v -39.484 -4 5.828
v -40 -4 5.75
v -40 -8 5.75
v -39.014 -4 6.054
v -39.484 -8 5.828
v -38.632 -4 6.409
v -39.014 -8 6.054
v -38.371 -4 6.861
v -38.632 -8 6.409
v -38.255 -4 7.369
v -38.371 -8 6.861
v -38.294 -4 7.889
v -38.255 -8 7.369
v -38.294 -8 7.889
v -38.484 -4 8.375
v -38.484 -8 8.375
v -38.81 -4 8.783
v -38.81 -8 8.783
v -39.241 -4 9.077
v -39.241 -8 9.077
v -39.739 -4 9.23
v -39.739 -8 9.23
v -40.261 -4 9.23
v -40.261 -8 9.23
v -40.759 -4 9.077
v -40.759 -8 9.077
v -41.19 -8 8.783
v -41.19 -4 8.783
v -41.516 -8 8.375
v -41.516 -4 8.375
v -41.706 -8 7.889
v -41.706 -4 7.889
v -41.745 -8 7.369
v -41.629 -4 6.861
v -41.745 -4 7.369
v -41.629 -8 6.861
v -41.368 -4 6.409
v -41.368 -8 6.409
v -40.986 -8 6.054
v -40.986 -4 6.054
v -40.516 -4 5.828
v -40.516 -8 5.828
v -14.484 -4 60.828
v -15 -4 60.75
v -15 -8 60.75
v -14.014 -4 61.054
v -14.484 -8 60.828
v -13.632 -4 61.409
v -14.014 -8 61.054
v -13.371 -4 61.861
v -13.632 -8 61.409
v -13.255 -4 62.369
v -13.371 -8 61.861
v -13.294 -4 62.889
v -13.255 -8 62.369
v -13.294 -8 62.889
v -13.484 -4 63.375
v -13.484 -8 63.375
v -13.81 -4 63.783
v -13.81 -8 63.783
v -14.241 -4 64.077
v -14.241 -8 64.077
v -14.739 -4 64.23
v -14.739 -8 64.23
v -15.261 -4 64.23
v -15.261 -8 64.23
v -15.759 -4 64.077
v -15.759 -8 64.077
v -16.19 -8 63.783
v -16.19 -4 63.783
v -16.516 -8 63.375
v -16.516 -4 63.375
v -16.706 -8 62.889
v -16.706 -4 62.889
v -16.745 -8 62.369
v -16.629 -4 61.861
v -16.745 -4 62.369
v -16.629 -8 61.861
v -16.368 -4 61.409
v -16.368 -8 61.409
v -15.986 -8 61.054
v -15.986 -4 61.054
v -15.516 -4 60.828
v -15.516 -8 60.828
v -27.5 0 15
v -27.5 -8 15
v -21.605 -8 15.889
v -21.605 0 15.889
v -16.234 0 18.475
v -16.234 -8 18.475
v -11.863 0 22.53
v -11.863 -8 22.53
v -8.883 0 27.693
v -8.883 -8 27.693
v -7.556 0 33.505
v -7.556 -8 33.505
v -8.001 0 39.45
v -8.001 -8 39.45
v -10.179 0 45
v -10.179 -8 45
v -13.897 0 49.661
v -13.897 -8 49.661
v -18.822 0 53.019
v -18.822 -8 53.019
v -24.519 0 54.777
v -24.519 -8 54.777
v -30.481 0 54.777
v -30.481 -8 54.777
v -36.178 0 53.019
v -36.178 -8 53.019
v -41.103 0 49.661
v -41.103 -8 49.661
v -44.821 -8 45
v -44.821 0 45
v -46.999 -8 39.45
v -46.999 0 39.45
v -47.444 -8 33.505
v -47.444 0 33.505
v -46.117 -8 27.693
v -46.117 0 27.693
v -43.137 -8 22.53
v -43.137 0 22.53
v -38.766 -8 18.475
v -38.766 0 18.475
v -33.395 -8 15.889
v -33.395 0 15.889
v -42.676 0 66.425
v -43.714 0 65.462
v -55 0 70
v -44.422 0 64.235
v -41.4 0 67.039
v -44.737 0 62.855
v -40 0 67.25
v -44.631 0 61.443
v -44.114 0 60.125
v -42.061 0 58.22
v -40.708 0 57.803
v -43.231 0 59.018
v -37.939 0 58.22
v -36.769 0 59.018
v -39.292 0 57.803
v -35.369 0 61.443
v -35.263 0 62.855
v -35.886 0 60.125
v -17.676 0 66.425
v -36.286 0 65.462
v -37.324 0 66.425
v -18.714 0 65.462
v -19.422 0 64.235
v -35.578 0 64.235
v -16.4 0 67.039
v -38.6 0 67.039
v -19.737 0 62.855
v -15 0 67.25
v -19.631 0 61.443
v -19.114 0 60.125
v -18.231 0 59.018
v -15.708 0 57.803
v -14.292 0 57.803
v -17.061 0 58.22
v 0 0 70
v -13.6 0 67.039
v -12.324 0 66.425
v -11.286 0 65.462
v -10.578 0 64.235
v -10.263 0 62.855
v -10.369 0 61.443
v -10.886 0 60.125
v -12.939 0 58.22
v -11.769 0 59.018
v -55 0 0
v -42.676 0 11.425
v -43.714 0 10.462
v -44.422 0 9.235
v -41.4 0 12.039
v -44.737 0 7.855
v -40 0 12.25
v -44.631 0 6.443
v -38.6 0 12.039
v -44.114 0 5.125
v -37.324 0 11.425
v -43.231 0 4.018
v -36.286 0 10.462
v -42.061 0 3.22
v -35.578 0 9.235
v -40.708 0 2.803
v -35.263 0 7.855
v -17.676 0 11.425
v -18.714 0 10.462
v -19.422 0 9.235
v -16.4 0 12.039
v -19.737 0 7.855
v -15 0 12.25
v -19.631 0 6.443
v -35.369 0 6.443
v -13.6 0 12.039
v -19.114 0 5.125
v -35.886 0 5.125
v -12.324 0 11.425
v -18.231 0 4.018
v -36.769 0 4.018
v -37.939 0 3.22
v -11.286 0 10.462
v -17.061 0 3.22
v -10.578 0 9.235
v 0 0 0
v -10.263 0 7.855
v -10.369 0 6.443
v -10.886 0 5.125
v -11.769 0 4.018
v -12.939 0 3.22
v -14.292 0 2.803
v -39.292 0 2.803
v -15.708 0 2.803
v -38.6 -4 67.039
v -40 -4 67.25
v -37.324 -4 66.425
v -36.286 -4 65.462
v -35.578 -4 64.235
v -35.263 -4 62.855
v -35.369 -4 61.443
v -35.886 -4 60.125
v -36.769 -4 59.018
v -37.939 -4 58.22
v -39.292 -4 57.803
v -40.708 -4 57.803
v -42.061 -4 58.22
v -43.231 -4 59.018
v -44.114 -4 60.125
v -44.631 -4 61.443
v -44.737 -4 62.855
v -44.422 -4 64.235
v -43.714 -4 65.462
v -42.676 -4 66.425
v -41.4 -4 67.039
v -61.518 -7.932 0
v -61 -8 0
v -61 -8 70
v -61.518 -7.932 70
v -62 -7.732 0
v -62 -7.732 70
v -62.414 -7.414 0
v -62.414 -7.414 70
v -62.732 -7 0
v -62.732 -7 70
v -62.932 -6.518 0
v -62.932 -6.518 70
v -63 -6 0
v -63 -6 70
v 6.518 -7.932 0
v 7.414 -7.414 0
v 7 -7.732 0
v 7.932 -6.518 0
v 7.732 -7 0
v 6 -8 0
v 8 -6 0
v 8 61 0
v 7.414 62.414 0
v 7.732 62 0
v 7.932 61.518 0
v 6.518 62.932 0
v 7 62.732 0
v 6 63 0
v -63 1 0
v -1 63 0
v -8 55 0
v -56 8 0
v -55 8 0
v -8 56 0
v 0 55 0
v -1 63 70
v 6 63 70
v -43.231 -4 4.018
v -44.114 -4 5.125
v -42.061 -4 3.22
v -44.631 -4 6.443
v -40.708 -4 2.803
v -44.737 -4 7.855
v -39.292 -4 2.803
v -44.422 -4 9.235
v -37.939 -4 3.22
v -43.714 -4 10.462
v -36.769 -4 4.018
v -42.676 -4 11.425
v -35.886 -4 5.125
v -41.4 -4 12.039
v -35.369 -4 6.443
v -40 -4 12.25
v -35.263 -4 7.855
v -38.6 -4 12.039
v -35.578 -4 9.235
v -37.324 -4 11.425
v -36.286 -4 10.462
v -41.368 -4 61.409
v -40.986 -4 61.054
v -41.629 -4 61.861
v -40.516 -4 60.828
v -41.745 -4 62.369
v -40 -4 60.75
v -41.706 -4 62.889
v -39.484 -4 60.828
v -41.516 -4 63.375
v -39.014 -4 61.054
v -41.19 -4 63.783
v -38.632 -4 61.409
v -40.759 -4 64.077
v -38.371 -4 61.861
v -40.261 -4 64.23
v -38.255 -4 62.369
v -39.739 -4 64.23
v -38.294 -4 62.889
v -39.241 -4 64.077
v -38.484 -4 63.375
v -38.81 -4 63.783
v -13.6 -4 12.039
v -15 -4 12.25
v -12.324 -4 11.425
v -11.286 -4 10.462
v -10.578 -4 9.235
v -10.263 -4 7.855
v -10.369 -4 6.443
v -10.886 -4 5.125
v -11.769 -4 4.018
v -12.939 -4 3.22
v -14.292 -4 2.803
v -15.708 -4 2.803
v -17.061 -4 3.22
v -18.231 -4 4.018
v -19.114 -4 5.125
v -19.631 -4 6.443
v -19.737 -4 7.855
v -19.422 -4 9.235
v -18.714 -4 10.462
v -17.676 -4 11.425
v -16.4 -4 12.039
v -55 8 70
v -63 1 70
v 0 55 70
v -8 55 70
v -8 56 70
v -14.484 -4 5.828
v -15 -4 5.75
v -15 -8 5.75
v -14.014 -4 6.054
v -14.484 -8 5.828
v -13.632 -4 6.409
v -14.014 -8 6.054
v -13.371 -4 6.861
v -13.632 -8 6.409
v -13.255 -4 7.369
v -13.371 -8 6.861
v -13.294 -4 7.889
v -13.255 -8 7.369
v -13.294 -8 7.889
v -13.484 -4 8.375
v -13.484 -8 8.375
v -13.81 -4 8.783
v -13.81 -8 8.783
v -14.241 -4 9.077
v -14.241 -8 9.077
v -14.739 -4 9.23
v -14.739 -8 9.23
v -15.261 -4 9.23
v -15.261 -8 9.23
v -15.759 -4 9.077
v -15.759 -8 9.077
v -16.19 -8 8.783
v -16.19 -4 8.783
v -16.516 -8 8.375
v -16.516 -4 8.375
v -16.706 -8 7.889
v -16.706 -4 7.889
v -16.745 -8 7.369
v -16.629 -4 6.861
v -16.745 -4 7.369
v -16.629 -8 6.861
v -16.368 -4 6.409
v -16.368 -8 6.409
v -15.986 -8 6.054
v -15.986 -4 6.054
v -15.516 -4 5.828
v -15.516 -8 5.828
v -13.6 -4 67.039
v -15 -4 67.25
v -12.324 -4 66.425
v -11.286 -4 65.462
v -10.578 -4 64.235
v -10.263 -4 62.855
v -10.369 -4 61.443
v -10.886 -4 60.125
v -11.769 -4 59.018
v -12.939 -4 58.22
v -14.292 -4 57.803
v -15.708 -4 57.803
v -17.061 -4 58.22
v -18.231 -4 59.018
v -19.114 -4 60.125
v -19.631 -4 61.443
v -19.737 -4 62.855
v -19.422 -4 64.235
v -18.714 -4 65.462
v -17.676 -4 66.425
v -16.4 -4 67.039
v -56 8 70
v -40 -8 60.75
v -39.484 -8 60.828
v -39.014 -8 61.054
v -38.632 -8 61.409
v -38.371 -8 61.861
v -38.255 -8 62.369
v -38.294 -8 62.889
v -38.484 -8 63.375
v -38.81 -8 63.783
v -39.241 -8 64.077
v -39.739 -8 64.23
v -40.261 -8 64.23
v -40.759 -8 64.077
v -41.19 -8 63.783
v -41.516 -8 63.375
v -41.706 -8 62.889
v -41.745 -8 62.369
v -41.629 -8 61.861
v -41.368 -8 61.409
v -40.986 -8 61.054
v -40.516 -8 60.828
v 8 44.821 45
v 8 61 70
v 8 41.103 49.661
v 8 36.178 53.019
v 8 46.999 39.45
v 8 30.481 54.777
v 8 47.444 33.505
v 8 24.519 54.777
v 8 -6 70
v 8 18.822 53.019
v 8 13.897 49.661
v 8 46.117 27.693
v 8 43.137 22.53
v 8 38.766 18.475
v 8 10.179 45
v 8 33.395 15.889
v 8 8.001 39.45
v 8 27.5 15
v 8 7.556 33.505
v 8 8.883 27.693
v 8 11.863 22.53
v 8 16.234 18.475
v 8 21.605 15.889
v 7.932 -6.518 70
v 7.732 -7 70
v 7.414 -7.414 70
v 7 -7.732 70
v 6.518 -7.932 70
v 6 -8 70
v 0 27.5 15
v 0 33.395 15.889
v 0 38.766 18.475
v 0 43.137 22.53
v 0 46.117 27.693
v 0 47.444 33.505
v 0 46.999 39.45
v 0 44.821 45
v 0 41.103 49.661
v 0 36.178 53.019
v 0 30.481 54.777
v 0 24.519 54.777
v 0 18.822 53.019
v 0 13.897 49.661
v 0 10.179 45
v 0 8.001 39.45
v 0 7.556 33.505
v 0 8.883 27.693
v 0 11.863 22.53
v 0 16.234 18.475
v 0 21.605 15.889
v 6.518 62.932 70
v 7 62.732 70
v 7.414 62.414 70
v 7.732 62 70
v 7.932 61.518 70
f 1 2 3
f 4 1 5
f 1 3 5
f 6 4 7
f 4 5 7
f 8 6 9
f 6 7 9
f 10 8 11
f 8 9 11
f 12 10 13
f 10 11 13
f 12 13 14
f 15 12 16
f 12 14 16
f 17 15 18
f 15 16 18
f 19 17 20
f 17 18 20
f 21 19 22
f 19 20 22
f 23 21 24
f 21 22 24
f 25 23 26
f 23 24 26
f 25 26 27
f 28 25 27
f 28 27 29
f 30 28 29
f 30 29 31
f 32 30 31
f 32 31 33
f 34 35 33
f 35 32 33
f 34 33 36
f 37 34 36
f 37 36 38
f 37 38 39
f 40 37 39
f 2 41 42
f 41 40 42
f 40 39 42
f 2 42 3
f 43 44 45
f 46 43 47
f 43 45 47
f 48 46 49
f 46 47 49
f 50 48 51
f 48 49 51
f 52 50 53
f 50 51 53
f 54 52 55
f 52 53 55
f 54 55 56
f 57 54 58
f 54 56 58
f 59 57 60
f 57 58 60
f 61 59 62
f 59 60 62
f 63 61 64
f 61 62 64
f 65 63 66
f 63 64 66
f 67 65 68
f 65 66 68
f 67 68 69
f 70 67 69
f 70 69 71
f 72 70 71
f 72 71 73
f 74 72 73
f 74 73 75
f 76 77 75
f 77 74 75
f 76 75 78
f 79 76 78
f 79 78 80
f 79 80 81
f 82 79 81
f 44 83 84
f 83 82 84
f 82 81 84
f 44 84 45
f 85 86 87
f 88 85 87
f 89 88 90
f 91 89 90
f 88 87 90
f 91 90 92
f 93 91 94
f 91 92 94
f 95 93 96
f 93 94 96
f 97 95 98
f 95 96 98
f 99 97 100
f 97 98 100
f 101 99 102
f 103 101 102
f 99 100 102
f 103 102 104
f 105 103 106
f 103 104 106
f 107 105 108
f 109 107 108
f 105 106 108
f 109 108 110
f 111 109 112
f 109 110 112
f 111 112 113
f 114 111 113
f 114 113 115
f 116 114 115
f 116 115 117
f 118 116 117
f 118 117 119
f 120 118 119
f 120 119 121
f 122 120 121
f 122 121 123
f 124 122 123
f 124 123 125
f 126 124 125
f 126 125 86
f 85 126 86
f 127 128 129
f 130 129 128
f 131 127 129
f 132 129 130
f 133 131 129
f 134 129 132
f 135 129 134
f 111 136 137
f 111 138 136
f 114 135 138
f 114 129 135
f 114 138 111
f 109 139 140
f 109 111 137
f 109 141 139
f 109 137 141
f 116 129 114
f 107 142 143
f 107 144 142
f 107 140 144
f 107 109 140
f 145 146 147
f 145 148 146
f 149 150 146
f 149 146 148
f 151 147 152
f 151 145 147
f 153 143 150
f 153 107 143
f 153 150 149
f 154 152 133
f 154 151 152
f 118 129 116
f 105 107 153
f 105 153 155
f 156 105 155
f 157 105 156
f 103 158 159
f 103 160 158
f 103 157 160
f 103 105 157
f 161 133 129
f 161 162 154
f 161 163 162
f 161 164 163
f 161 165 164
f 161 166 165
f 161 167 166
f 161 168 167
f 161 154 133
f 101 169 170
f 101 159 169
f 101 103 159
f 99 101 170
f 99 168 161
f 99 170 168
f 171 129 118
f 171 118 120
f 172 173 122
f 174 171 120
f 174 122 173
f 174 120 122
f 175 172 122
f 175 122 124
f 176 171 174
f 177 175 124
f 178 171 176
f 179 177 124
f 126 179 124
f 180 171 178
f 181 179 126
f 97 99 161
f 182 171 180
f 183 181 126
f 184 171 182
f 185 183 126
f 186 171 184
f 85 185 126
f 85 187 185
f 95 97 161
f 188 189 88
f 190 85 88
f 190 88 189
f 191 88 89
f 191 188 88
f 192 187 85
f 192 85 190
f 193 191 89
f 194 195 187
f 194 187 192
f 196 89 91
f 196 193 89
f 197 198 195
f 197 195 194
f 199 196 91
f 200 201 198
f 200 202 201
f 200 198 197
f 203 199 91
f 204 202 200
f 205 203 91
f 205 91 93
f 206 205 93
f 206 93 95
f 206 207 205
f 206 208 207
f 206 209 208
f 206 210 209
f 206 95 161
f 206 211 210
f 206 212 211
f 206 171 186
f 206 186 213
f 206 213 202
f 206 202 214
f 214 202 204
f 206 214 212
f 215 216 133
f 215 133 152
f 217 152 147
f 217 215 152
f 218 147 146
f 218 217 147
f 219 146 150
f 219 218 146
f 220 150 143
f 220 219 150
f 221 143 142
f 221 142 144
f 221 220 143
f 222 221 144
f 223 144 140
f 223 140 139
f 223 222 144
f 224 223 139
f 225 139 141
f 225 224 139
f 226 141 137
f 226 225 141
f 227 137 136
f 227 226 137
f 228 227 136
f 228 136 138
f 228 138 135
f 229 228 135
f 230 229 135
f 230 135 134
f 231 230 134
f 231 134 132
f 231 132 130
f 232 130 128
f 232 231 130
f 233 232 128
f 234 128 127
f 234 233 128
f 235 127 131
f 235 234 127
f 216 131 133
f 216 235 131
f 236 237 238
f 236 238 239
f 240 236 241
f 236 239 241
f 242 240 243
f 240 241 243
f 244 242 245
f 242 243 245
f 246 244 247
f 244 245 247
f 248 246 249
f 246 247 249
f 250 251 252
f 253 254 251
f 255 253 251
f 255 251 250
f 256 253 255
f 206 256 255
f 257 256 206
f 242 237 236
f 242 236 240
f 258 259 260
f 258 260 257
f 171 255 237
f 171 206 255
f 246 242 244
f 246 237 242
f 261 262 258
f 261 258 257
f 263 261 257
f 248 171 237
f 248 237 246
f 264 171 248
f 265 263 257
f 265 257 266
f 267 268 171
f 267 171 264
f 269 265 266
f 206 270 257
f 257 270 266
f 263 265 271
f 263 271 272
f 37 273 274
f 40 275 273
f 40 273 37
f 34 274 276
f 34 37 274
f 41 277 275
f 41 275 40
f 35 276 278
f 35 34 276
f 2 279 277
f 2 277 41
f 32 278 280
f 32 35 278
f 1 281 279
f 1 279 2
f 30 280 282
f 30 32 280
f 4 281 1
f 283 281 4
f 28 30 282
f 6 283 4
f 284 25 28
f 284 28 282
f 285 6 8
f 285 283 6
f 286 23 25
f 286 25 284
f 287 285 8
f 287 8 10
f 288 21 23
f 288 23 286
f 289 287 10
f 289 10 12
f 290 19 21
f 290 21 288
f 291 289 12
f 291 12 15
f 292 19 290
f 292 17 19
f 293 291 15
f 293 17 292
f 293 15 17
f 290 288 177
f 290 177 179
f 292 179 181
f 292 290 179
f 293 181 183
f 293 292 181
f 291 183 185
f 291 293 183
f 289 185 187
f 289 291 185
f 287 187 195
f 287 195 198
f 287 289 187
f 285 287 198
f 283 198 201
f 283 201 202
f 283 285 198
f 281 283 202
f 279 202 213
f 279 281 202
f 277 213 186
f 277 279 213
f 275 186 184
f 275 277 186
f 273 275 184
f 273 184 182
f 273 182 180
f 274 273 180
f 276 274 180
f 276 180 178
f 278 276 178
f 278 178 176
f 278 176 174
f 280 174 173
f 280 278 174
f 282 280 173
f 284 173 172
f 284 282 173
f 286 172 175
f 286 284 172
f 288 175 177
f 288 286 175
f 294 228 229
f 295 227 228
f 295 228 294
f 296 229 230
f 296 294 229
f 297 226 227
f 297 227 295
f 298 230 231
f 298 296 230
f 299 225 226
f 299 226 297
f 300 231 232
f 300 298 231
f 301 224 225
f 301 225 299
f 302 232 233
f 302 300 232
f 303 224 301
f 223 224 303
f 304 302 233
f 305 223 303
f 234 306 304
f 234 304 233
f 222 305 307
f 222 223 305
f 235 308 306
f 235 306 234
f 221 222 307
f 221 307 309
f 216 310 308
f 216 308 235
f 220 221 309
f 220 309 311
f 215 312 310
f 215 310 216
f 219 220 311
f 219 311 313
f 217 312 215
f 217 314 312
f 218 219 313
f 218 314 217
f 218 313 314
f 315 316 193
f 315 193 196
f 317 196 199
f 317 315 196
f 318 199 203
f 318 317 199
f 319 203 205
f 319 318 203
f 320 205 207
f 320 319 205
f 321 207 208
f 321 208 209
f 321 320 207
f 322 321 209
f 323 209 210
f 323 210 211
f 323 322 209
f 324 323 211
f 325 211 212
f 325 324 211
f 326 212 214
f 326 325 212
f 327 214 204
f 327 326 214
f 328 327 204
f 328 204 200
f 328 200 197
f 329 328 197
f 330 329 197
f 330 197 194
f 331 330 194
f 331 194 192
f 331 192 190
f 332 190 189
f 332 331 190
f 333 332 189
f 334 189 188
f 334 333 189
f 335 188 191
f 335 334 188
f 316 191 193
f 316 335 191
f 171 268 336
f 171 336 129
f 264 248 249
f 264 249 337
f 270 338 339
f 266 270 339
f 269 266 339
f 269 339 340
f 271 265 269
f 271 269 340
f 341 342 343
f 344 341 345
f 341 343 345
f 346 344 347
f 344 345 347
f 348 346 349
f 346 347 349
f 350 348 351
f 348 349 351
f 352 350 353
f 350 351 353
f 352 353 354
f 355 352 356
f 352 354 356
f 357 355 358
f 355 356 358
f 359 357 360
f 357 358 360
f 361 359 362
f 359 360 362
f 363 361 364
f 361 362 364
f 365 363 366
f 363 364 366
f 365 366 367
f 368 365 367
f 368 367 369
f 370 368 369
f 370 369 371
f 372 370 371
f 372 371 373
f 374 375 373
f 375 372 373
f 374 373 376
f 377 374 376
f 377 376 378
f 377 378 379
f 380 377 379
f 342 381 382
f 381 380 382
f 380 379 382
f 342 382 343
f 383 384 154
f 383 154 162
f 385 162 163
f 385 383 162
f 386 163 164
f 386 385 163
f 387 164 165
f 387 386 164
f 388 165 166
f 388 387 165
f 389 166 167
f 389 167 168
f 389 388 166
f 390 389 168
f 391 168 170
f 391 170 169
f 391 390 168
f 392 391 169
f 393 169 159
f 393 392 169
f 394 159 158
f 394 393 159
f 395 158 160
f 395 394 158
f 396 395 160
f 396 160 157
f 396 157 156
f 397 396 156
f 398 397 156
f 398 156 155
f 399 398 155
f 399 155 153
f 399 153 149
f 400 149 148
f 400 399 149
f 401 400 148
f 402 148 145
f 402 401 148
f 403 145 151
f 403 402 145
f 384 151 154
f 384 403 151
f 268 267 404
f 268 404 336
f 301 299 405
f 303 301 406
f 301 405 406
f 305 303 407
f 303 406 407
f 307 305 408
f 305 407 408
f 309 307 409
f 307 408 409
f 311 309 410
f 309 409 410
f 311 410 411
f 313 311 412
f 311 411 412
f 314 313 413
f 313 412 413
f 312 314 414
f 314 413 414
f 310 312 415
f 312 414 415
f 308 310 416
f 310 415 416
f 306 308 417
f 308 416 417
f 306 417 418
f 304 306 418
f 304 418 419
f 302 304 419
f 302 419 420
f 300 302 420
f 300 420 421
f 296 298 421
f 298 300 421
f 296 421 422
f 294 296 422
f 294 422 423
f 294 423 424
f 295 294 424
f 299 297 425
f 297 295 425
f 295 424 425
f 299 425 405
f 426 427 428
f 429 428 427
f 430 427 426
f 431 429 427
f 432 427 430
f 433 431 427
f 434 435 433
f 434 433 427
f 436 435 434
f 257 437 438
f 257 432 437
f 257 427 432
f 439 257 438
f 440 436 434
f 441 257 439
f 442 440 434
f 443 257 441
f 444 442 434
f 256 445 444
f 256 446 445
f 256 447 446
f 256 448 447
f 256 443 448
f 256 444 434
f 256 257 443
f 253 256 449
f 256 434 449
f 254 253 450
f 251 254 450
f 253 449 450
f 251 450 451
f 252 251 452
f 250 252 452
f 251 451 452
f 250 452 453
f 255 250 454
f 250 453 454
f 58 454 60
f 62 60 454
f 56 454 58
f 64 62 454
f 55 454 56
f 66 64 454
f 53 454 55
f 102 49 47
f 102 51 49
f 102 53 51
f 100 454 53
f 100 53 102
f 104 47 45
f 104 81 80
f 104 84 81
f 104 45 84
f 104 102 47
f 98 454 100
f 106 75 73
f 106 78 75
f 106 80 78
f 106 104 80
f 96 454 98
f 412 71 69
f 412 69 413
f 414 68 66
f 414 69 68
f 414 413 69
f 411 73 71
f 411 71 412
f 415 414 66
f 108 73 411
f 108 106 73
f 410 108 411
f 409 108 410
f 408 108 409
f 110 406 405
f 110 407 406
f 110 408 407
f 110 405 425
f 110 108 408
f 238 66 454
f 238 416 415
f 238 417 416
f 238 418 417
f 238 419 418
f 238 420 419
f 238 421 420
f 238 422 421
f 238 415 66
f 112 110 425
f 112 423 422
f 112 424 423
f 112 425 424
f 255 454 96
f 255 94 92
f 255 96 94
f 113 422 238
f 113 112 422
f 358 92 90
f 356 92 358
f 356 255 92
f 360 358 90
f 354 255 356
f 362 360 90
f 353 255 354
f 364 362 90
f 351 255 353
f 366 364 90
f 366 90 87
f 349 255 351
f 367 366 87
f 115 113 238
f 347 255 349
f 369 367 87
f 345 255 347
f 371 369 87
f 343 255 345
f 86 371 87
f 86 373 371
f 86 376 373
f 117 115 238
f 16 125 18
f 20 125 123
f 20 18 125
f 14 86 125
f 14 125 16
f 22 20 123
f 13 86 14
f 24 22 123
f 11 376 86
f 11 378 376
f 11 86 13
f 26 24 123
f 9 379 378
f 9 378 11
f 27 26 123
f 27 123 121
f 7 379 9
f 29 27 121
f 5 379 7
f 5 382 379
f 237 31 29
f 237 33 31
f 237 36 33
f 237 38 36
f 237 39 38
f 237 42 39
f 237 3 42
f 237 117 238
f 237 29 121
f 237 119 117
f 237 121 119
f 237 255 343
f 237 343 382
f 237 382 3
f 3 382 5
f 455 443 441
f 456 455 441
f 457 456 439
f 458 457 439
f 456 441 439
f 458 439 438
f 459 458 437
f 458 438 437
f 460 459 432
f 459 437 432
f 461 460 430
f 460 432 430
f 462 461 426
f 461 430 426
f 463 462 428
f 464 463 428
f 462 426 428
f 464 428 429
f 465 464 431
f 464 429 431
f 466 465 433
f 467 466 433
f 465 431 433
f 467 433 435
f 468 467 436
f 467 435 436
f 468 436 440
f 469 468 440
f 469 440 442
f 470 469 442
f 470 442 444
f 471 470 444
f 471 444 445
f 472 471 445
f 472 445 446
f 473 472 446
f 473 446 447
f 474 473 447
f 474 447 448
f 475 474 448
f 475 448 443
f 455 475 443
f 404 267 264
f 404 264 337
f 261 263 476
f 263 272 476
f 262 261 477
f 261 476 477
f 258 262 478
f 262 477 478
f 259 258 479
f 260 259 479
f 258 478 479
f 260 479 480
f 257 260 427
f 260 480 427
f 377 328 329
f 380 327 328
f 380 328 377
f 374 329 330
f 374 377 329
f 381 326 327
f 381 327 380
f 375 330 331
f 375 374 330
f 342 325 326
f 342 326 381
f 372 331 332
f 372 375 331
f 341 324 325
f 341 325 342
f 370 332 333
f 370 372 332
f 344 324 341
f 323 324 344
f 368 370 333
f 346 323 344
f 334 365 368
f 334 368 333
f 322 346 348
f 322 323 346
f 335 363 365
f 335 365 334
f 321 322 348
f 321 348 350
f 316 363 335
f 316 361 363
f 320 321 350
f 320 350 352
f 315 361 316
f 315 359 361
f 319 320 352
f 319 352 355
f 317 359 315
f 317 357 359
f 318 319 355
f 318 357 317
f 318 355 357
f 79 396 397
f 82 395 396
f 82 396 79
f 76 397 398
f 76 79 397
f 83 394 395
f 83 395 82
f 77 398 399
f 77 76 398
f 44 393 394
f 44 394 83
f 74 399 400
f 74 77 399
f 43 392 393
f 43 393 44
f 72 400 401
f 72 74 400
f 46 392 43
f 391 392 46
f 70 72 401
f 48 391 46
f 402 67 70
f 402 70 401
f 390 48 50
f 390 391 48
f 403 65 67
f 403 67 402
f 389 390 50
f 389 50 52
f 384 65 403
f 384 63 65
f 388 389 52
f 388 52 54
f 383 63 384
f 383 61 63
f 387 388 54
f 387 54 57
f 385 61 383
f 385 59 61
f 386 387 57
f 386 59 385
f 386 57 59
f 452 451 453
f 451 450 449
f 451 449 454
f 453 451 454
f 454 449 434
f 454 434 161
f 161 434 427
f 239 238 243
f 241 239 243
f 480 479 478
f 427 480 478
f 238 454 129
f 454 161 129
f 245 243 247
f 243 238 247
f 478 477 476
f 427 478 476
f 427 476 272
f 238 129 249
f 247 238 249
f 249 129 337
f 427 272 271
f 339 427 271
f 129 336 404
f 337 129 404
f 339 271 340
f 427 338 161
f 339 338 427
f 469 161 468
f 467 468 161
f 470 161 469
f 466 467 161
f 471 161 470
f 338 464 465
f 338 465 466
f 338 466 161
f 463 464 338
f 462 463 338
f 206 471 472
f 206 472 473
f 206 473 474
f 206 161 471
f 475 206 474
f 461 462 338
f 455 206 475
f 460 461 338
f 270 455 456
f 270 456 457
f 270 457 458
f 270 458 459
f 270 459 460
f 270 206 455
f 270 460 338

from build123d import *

# Parameters (mm, degrees)
BOSS_EXTRUDE1_DEPTH = 70
CHAMFER1_SIZE       = 7
FILLET1_R           = 2
SKETCH2_R           = 1.75
SKETCH2_R_2         = 20
CUT_EXTRUDE1_DEPTH  = 23
CUT_EXTRUDE2_START  = -4
SKETCH3_R           = 4.75
SKETCH3_R_2         = 1.75
CUT_EXTRUDE2_DEPTH  = 4
SKETCH5_R           = 20
CUT_EXTRUDE3_DEPTH  = 23


with BuildPart() as part:
    # Sketch1 → Boss-Extrude1 (new body)
    with BuildSketch(Plane.XY):
        Polygon((-55, 0), (0, 0), (0, 55), (-8, 55), (-8, 63), (8, 63), (8, -8), (-63, -8), (-63, 8), (-55, 8), align=None)
    extrude(amount=BOSS_EXTRUDE1_DEPTH)

    # Chamfer1
    chamfer1_edges = [part.edges().sort_by_distance(p)[0] for p in [
        (-8, 63, 35),
        (-63, 8, 35),
    ]]
    chamfer(chamfer1_edges, length=CHAMFER1_SIZE)

    # Fillet1
    fillet1_edges = [part.edges().sort_by_distance(p)[0] for p in [
        (8, 63, 35),
        (8, -8, 35),
        (-63, -8, 35),
    ]]
    fillet(fillet1_edges, radius=FILLET1_R)

    # Sketch2 → Cut-Extrude1 (cut)
    with BuildSketch(Plane.XZ.offset(8)):
        with Locations(Location((-40, 62.5, 0), (0, 0, 270))):
            Circle(SKETCH2_R)
        with Locations(Location((-15, 62.5, 0), (0, 0, 270))):
            Circle(SKETCH2_R)
        with Locations(Location((-15, 7.5, 0), (0, 0, 270))):
            Circle(SKETCH2_R)
        with Locations(Location((-40, 7.5, 0), (0, 0, 270))):
            Circle(SKETCH2_R)
        with Locations(Location((-27.5, 35, 0), (0, 0, 270))):
            Circle(SKETCH2_R_2)
    extrude(amount=-CUT_EXTRUDE1_DEPTH, mode=Mode.SUBTRACT)

    # Sketch3 → Cut-Extrude2 (cut)
    # profile 1 of 4: a face of its own
    with BuildSketch(Plane(origin=(0, 0, 0), x_dir=(1, 0, 0), z_dir=(0, 1, 0)).offset(CUT_EXTRUDE2_START)):
        with Locations(Location((-40, -62.5, 0), (0, 0, 270))):
            Circle(SKETCH3_R)
        with Locations(Location((-40, -62.5, 0), (0, 0, 90))):
            Circle(SKETCH3_R_2, mode=Mode.SUBTRACT)
    # profile 2 of 4: a face of its own
    with BuildSketch(Plane(origin=(0, 0, 0), x_dir=(1, 0, 0), z_dir=(0, 1, 0)).offset(CUT_EXTRUDE2_START)):
        with Locations(Location((-15, -62.5, 0), (0, 0, 270))):
            Circle(SKETCH3_R)
        with Locations(Location((-15, -62.5, 0), (0, 0, 90))):
            Circle(SKETCH3_R_2, mode=Mode.SUBTRACT)
    # profile 3 of 4: a face of its own
    with BuildSketch(Plane(origin=(0, 0, 0), x_dir=(1, 0, 0), z_dir=(0, 1, 0)).offset(CUT_EXTRUDE2_START)):
        with Locations(Location((-15, -7.5, 0), (0, 0, 270))):
            Circle(SKETCH3_R)
        with Locations(Location((-15, -7.5, 0), (0, 0, 90))):
            Circle(SKETCH3_R_2, mode=Mode.SUBTRACT)
    # profile 4 of 4: a face of its own
    with BuildSketch(Plane(origin=(0, 0, 0), x_dir=(1, 0, 0), z_dir=(0, 1, 0)).offset(CUT_EXTRUDE2_START)):
        with Locations(Location((-40, -7.5, 0), (0, 0, 270))):
            Circle(SKETCH3_R)
        with Locations(Location((-40, -7.5, 0), (0, 0, 90))):
            Circle(SKETCH3_R_2, mode=Mode.SUBTRACT)
    extrude(amount=CUT_EXTRUDE2_DEPTH, mode=Mode.SUBTRACT)

    # Sketch5 → Cut-Extrude3 (cut)
    with BuildSketch(Plane(origin=(8, 0, 0), x_dir=(0, 0, -1), z_dir=(1, 0, 0))):
        with Locations((-35, 27.5)):
            Circle(SKETCH5_R)
    extrude(amount=-CUT_EXTRUDE3_DEPTH, mode=Mode.SUBTRACT)


solid = part.part
